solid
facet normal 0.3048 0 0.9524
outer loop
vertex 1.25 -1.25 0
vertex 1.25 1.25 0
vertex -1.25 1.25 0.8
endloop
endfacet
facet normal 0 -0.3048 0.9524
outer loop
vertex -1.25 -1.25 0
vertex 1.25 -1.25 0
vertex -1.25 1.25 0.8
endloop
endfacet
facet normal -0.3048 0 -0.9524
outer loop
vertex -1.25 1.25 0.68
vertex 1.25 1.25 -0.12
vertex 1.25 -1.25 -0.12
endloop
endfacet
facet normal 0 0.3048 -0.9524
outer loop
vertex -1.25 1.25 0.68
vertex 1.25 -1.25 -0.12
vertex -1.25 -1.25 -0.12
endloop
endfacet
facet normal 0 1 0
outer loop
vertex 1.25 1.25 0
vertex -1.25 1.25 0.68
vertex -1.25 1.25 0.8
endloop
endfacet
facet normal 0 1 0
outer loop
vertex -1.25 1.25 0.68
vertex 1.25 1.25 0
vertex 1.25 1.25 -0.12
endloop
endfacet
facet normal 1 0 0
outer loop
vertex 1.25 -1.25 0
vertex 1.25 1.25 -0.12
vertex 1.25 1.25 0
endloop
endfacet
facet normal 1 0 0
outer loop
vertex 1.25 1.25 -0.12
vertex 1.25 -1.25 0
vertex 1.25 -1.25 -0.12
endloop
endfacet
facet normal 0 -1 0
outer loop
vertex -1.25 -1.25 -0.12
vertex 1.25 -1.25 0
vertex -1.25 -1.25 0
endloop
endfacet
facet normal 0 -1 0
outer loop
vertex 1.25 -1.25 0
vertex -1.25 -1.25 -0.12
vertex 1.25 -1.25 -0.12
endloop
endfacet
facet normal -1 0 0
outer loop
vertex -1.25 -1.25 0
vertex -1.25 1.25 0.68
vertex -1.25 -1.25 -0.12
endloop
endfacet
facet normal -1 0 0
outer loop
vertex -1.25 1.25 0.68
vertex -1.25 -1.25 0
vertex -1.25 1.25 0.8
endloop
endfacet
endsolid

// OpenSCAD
// Shed shell kit: roof hip. See lib/lodge_kit.scad.
include <lib/lodge_kit.scad>
kind = "shed";
roof_tile([1, 0, 0, 0], 0);
